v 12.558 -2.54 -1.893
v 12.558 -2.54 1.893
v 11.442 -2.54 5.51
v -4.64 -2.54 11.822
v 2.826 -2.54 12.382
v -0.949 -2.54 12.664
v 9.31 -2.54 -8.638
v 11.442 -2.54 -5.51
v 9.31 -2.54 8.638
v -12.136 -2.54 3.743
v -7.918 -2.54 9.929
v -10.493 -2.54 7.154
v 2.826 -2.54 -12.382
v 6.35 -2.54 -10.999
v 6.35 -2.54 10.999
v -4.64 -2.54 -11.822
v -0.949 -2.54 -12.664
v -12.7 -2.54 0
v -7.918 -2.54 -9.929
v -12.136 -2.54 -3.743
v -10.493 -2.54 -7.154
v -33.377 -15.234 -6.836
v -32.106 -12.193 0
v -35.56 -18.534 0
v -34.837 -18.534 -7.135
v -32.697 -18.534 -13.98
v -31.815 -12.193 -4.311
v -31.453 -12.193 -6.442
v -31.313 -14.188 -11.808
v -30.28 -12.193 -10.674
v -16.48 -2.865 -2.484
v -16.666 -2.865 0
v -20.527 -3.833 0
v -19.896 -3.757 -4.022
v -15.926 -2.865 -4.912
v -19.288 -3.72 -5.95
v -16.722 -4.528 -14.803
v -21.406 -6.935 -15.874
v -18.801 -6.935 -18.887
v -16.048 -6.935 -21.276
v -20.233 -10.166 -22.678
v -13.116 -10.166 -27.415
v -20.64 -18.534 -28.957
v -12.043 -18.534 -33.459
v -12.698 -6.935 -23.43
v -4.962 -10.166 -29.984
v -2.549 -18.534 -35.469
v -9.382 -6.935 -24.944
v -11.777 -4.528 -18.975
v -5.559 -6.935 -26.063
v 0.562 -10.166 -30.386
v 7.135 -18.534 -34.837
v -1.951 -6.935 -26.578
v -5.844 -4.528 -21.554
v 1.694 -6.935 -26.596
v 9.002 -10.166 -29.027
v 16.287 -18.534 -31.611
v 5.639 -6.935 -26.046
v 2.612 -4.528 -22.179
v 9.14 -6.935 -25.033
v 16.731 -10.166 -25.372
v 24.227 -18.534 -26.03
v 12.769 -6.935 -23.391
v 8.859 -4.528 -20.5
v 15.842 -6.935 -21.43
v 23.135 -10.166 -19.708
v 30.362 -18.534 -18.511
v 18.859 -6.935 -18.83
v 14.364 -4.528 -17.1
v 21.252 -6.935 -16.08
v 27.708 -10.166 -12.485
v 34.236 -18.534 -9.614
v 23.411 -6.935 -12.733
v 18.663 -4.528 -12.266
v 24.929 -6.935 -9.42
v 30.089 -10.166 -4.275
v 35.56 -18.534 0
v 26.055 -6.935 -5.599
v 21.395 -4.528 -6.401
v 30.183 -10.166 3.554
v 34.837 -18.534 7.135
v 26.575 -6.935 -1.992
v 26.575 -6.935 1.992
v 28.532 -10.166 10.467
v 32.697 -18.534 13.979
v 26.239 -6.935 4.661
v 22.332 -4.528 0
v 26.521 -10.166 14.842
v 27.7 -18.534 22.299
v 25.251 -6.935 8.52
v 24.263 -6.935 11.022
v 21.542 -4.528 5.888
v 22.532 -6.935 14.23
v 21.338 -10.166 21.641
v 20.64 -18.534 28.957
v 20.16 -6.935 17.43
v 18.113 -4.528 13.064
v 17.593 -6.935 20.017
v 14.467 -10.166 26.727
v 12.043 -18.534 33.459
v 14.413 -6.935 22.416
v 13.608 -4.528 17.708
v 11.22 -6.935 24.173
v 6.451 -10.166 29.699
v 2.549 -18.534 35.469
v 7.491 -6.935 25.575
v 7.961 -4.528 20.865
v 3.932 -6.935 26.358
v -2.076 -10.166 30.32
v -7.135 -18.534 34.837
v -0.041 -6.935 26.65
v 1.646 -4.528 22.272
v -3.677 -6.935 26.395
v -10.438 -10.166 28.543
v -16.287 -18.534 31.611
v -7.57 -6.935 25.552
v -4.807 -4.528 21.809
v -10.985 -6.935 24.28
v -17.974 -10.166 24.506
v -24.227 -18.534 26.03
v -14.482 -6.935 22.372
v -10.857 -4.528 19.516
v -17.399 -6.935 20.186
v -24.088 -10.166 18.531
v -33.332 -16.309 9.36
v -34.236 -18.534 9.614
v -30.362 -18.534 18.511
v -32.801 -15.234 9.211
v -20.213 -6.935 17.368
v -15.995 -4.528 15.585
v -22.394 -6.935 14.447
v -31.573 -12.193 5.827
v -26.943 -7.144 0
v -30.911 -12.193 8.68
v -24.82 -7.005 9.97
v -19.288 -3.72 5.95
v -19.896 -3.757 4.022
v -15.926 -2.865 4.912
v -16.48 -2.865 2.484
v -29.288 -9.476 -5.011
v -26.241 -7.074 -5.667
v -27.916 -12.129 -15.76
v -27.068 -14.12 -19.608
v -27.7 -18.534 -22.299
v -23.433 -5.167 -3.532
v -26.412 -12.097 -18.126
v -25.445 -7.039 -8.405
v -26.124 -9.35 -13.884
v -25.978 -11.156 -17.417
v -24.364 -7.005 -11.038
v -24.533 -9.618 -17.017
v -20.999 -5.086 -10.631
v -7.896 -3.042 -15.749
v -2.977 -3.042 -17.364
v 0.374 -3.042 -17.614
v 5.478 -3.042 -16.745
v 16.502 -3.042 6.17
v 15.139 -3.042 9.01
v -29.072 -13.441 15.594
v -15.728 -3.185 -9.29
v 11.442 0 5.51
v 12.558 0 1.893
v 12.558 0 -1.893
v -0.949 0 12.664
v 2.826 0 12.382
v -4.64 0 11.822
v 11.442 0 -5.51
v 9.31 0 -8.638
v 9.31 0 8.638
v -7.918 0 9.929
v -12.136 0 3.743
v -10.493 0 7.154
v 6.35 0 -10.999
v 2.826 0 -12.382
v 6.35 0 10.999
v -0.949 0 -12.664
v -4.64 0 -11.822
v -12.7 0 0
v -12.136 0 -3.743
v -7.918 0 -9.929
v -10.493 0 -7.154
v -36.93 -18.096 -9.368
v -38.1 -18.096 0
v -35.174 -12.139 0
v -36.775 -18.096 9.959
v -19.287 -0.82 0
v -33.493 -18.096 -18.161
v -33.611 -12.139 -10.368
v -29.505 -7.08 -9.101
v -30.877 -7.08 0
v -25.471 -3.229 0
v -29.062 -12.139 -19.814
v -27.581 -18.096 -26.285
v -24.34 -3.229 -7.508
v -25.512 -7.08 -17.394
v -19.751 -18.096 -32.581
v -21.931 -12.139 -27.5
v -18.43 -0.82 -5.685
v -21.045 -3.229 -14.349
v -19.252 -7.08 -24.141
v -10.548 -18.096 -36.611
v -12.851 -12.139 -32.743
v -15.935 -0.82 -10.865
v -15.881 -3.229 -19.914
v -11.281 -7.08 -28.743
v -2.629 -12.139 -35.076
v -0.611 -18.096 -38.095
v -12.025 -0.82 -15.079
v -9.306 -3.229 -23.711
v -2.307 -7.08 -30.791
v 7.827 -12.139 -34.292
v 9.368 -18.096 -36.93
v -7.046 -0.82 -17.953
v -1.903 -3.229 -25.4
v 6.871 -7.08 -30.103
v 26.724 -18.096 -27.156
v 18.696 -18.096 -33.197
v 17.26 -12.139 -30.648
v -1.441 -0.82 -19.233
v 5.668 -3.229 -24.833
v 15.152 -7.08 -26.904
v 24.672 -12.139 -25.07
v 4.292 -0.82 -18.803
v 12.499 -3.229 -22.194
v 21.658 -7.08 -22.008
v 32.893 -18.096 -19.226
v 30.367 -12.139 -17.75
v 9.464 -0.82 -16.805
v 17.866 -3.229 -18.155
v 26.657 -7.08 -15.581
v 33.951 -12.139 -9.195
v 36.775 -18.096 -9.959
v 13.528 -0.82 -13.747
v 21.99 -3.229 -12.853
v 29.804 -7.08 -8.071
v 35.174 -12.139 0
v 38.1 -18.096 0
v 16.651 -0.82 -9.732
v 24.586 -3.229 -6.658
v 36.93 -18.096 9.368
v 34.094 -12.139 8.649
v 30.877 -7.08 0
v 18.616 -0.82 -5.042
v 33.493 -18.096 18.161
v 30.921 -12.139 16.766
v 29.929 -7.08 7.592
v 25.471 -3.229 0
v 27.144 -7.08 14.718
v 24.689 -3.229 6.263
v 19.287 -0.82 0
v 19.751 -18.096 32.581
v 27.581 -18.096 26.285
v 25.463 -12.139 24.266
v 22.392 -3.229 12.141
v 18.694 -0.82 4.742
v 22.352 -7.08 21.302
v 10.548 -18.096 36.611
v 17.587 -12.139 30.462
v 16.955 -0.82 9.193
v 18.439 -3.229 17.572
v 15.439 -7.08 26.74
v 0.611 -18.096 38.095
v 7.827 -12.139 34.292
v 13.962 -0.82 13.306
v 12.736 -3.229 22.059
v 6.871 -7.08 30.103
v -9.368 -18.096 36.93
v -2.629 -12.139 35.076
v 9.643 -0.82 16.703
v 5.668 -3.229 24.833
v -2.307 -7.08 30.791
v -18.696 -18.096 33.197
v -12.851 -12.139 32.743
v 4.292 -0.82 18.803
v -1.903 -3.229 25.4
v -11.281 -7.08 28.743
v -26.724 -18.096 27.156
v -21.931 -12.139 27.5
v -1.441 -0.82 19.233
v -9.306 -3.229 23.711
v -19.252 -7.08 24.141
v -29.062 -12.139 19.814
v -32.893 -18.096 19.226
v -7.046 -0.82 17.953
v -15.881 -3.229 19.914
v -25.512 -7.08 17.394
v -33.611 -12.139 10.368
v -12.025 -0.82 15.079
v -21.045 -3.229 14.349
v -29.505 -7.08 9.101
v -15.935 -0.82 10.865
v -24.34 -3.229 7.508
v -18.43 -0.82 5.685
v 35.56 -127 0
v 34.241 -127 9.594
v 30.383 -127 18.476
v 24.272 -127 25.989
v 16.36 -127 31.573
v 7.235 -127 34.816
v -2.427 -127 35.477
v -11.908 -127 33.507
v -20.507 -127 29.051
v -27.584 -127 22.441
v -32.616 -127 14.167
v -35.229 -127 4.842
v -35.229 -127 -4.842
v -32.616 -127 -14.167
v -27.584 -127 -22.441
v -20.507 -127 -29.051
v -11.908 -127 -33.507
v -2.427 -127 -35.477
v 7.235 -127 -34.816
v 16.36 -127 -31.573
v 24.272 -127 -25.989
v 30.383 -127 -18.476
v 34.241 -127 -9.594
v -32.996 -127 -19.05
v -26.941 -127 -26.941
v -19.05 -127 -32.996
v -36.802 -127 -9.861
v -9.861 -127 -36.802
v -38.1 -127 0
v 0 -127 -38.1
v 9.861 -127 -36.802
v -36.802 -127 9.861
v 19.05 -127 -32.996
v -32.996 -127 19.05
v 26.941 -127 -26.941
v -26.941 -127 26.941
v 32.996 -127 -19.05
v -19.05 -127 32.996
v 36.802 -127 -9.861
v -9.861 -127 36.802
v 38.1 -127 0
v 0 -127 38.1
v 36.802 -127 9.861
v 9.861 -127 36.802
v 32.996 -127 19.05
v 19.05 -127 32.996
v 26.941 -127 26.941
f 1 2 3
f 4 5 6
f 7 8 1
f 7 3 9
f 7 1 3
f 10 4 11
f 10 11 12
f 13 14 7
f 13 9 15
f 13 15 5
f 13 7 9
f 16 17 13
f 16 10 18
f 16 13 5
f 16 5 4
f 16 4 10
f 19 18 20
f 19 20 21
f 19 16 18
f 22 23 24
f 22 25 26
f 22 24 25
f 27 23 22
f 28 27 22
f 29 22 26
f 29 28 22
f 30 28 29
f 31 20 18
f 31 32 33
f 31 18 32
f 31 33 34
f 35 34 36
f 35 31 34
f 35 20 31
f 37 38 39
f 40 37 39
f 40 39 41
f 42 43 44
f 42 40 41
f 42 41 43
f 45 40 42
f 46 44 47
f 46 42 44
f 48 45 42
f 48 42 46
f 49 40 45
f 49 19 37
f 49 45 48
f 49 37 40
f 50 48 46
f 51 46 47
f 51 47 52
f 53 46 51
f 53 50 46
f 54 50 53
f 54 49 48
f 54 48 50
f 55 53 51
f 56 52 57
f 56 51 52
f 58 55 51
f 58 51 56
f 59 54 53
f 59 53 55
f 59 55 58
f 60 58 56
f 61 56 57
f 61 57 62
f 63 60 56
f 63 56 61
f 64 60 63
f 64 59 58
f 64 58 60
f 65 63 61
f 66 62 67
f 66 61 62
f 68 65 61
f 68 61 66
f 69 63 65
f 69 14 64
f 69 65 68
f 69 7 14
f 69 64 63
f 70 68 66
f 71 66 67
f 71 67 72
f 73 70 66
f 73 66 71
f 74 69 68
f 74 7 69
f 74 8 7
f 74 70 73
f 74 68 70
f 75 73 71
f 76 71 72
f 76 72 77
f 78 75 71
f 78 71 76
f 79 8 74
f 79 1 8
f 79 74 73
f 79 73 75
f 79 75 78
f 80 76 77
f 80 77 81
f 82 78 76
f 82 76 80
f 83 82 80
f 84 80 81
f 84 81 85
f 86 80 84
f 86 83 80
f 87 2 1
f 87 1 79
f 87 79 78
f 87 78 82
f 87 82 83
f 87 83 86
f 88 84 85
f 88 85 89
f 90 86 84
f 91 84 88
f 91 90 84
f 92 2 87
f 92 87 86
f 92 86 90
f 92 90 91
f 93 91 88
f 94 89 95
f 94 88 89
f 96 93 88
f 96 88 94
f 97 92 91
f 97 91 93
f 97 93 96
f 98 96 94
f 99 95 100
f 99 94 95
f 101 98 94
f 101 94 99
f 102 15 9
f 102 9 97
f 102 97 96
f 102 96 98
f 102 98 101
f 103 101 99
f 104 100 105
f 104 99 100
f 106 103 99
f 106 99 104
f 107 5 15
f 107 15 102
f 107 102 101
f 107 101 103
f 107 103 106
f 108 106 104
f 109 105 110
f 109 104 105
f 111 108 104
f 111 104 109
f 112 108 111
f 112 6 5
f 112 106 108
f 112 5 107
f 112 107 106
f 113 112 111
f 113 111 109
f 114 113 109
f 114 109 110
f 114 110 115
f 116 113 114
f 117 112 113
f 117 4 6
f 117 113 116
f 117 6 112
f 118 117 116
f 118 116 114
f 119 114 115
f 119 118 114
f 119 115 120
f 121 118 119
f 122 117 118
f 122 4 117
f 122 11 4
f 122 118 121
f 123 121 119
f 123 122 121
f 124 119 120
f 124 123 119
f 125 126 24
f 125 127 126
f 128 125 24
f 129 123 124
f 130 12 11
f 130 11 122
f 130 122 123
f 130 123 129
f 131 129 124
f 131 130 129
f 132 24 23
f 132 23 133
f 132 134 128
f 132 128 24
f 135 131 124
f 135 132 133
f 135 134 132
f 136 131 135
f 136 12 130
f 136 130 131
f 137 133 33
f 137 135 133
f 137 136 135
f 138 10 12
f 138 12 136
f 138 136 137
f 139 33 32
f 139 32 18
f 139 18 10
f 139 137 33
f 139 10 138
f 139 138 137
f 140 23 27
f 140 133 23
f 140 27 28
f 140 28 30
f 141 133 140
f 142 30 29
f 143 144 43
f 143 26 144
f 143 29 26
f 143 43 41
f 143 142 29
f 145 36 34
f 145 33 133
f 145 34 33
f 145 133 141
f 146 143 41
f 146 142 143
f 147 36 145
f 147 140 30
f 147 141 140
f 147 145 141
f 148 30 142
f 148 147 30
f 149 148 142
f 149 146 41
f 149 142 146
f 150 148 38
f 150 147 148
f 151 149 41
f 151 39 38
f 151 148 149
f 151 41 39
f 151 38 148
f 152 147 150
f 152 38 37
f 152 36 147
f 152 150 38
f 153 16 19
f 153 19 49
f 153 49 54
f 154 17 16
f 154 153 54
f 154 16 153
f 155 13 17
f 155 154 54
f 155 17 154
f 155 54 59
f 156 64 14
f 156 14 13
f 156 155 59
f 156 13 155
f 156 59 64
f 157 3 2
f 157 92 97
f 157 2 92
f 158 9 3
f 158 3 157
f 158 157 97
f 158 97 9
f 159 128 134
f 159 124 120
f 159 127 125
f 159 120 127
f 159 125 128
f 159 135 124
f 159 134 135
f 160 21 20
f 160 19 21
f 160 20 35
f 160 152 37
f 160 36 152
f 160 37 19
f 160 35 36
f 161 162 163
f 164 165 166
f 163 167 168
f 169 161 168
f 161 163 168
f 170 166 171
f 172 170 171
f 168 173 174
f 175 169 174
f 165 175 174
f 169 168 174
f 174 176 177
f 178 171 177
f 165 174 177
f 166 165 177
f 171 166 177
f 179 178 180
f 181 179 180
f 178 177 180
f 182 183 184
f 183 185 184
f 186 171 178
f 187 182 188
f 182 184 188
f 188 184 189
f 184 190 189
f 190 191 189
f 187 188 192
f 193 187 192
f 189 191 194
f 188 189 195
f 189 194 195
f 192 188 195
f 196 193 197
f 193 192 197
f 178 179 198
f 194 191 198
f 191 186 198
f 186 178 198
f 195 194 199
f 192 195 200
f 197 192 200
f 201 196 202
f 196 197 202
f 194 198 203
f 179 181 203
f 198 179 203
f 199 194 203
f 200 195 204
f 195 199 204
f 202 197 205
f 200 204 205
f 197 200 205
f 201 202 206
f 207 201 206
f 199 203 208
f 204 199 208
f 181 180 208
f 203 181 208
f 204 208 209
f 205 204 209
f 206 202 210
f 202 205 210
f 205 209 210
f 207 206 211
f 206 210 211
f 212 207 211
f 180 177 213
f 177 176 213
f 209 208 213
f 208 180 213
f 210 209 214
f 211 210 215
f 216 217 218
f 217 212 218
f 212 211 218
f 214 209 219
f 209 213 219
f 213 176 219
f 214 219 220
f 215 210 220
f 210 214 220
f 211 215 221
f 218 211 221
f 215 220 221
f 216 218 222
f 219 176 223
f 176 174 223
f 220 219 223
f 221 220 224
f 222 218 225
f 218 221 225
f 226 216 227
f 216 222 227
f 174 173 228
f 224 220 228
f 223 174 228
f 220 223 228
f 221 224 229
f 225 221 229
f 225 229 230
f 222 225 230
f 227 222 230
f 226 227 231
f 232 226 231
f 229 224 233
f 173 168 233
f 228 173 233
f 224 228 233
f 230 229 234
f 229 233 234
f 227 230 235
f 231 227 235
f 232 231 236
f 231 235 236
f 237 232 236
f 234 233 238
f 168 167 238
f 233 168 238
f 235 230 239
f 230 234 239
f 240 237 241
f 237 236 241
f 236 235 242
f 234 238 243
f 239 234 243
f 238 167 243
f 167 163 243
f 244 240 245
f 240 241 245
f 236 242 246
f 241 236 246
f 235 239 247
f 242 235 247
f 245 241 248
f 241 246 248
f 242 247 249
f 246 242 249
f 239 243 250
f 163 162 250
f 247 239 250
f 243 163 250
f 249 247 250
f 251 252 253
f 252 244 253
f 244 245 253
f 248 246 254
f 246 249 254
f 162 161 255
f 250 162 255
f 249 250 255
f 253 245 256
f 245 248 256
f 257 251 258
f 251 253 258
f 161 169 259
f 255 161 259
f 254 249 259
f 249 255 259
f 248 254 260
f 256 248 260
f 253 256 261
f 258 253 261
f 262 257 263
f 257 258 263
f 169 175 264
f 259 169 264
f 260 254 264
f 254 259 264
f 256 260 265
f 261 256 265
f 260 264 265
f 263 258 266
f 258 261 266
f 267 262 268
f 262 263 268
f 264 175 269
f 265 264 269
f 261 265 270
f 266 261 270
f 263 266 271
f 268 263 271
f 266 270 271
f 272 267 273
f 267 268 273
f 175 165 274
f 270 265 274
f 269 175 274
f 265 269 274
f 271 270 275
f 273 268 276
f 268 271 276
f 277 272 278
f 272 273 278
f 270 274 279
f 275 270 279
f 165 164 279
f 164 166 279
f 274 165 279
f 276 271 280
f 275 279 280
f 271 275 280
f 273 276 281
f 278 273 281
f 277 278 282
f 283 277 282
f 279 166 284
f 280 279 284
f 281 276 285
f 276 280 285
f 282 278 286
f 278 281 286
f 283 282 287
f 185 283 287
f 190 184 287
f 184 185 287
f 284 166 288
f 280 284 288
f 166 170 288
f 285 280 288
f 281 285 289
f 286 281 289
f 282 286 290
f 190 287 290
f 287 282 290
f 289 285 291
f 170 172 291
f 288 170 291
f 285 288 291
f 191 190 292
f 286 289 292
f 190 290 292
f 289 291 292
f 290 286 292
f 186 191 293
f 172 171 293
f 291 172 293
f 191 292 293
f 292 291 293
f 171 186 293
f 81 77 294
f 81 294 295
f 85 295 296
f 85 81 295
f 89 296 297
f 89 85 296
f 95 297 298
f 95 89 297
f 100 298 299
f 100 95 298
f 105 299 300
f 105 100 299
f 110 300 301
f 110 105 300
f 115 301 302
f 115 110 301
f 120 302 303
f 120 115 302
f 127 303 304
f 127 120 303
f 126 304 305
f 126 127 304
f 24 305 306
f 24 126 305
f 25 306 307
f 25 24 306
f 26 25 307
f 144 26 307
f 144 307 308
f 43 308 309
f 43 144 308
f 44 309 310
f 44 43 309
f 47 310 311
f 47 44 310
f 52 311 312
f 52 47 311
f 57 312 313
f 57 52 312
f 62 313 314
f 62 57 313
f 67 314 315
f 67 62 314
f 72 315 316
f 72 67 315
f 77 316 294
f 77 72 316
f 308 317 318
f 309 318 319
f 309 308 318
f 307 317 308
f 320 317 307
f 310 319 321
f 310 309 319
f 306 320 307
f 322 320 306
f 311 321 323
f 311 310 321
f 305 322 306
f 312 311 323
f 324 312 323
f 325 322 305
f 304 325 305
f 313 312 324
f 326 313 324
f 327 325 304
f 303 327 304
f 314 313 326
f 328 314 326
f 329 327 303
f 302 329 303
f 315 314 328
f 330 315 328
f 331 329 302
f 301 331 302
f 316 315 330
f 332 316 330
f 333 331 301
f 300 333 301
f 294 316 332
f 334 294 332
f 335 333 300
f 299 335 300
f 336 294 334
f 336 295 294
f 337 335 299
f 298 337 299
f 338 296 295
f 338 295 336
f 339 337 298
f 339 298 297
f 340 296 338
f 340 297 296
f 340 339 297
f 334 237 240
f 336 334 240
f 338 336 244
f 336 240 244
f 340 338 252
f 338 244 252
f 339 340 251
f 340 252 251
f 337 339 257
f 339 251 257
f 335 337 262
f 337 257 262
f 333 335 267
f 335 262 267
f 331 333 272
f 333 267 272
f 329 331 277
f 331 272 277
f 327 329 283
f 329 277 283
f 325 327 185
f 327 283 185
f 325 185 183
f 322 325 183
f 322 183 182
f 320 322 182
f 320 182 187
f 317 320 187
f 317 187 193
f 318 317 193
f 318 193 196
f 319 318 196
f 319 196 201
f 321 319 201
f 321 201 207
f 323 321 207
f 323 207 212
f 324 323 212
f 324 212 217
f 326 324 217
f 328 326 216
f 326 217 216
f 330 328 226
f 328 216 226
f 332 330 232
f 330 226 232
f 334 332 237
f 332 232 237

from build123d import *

# Parameters (mm, degrees)
F0_R     = 38.1
F1_DEPTH = 127
F6_T     = -2.54


# Not quite as in the source:
# - a feature of the source that left no trace in its solid (it failed there, or was rolled back) is left out


with BuildPart() as f1:
    # F0 (on Front) → F1 (new body)
    with BuildSketch(Plane.XZ):
        Circle(F0_R)
    extrude(amount=F1_DEPTH)

    # F2 (on Top) → F3 (revolve, cut)
    with BuildSketch(Plane.XY):
        with BuildLine():
            Line((-12.7, 0), (0, 0))
            Line((0, 0), (0, 26.976691559))
            Line((0, 26.976691559), (-68.359054625, 26.976691559))
            Line((-68.359054625, 26.976691559), (-68.359054625, -28.0306376517))
            Line((-68.359054625, -28.0306376517), (-39.5489111543, -28.0306376517))
            ThreePointArc((-39.5489111543, -28.0306376517), (-32.1073483334, -8.2846551837), (-12.7, 0))
        make_face()
    revolve(axis=Axis((0, 13.4883457795, 0), (0, -1, 0)), mode=Mode.SUBTRACT)

    # F6
    f6_openings = [f1.faces().sort_by_distance(p)[0] for p in [
        (0, -127, 0),
    ]]
    offset(amount=F6_T, openings=f6_openings)


solid = f1.part
